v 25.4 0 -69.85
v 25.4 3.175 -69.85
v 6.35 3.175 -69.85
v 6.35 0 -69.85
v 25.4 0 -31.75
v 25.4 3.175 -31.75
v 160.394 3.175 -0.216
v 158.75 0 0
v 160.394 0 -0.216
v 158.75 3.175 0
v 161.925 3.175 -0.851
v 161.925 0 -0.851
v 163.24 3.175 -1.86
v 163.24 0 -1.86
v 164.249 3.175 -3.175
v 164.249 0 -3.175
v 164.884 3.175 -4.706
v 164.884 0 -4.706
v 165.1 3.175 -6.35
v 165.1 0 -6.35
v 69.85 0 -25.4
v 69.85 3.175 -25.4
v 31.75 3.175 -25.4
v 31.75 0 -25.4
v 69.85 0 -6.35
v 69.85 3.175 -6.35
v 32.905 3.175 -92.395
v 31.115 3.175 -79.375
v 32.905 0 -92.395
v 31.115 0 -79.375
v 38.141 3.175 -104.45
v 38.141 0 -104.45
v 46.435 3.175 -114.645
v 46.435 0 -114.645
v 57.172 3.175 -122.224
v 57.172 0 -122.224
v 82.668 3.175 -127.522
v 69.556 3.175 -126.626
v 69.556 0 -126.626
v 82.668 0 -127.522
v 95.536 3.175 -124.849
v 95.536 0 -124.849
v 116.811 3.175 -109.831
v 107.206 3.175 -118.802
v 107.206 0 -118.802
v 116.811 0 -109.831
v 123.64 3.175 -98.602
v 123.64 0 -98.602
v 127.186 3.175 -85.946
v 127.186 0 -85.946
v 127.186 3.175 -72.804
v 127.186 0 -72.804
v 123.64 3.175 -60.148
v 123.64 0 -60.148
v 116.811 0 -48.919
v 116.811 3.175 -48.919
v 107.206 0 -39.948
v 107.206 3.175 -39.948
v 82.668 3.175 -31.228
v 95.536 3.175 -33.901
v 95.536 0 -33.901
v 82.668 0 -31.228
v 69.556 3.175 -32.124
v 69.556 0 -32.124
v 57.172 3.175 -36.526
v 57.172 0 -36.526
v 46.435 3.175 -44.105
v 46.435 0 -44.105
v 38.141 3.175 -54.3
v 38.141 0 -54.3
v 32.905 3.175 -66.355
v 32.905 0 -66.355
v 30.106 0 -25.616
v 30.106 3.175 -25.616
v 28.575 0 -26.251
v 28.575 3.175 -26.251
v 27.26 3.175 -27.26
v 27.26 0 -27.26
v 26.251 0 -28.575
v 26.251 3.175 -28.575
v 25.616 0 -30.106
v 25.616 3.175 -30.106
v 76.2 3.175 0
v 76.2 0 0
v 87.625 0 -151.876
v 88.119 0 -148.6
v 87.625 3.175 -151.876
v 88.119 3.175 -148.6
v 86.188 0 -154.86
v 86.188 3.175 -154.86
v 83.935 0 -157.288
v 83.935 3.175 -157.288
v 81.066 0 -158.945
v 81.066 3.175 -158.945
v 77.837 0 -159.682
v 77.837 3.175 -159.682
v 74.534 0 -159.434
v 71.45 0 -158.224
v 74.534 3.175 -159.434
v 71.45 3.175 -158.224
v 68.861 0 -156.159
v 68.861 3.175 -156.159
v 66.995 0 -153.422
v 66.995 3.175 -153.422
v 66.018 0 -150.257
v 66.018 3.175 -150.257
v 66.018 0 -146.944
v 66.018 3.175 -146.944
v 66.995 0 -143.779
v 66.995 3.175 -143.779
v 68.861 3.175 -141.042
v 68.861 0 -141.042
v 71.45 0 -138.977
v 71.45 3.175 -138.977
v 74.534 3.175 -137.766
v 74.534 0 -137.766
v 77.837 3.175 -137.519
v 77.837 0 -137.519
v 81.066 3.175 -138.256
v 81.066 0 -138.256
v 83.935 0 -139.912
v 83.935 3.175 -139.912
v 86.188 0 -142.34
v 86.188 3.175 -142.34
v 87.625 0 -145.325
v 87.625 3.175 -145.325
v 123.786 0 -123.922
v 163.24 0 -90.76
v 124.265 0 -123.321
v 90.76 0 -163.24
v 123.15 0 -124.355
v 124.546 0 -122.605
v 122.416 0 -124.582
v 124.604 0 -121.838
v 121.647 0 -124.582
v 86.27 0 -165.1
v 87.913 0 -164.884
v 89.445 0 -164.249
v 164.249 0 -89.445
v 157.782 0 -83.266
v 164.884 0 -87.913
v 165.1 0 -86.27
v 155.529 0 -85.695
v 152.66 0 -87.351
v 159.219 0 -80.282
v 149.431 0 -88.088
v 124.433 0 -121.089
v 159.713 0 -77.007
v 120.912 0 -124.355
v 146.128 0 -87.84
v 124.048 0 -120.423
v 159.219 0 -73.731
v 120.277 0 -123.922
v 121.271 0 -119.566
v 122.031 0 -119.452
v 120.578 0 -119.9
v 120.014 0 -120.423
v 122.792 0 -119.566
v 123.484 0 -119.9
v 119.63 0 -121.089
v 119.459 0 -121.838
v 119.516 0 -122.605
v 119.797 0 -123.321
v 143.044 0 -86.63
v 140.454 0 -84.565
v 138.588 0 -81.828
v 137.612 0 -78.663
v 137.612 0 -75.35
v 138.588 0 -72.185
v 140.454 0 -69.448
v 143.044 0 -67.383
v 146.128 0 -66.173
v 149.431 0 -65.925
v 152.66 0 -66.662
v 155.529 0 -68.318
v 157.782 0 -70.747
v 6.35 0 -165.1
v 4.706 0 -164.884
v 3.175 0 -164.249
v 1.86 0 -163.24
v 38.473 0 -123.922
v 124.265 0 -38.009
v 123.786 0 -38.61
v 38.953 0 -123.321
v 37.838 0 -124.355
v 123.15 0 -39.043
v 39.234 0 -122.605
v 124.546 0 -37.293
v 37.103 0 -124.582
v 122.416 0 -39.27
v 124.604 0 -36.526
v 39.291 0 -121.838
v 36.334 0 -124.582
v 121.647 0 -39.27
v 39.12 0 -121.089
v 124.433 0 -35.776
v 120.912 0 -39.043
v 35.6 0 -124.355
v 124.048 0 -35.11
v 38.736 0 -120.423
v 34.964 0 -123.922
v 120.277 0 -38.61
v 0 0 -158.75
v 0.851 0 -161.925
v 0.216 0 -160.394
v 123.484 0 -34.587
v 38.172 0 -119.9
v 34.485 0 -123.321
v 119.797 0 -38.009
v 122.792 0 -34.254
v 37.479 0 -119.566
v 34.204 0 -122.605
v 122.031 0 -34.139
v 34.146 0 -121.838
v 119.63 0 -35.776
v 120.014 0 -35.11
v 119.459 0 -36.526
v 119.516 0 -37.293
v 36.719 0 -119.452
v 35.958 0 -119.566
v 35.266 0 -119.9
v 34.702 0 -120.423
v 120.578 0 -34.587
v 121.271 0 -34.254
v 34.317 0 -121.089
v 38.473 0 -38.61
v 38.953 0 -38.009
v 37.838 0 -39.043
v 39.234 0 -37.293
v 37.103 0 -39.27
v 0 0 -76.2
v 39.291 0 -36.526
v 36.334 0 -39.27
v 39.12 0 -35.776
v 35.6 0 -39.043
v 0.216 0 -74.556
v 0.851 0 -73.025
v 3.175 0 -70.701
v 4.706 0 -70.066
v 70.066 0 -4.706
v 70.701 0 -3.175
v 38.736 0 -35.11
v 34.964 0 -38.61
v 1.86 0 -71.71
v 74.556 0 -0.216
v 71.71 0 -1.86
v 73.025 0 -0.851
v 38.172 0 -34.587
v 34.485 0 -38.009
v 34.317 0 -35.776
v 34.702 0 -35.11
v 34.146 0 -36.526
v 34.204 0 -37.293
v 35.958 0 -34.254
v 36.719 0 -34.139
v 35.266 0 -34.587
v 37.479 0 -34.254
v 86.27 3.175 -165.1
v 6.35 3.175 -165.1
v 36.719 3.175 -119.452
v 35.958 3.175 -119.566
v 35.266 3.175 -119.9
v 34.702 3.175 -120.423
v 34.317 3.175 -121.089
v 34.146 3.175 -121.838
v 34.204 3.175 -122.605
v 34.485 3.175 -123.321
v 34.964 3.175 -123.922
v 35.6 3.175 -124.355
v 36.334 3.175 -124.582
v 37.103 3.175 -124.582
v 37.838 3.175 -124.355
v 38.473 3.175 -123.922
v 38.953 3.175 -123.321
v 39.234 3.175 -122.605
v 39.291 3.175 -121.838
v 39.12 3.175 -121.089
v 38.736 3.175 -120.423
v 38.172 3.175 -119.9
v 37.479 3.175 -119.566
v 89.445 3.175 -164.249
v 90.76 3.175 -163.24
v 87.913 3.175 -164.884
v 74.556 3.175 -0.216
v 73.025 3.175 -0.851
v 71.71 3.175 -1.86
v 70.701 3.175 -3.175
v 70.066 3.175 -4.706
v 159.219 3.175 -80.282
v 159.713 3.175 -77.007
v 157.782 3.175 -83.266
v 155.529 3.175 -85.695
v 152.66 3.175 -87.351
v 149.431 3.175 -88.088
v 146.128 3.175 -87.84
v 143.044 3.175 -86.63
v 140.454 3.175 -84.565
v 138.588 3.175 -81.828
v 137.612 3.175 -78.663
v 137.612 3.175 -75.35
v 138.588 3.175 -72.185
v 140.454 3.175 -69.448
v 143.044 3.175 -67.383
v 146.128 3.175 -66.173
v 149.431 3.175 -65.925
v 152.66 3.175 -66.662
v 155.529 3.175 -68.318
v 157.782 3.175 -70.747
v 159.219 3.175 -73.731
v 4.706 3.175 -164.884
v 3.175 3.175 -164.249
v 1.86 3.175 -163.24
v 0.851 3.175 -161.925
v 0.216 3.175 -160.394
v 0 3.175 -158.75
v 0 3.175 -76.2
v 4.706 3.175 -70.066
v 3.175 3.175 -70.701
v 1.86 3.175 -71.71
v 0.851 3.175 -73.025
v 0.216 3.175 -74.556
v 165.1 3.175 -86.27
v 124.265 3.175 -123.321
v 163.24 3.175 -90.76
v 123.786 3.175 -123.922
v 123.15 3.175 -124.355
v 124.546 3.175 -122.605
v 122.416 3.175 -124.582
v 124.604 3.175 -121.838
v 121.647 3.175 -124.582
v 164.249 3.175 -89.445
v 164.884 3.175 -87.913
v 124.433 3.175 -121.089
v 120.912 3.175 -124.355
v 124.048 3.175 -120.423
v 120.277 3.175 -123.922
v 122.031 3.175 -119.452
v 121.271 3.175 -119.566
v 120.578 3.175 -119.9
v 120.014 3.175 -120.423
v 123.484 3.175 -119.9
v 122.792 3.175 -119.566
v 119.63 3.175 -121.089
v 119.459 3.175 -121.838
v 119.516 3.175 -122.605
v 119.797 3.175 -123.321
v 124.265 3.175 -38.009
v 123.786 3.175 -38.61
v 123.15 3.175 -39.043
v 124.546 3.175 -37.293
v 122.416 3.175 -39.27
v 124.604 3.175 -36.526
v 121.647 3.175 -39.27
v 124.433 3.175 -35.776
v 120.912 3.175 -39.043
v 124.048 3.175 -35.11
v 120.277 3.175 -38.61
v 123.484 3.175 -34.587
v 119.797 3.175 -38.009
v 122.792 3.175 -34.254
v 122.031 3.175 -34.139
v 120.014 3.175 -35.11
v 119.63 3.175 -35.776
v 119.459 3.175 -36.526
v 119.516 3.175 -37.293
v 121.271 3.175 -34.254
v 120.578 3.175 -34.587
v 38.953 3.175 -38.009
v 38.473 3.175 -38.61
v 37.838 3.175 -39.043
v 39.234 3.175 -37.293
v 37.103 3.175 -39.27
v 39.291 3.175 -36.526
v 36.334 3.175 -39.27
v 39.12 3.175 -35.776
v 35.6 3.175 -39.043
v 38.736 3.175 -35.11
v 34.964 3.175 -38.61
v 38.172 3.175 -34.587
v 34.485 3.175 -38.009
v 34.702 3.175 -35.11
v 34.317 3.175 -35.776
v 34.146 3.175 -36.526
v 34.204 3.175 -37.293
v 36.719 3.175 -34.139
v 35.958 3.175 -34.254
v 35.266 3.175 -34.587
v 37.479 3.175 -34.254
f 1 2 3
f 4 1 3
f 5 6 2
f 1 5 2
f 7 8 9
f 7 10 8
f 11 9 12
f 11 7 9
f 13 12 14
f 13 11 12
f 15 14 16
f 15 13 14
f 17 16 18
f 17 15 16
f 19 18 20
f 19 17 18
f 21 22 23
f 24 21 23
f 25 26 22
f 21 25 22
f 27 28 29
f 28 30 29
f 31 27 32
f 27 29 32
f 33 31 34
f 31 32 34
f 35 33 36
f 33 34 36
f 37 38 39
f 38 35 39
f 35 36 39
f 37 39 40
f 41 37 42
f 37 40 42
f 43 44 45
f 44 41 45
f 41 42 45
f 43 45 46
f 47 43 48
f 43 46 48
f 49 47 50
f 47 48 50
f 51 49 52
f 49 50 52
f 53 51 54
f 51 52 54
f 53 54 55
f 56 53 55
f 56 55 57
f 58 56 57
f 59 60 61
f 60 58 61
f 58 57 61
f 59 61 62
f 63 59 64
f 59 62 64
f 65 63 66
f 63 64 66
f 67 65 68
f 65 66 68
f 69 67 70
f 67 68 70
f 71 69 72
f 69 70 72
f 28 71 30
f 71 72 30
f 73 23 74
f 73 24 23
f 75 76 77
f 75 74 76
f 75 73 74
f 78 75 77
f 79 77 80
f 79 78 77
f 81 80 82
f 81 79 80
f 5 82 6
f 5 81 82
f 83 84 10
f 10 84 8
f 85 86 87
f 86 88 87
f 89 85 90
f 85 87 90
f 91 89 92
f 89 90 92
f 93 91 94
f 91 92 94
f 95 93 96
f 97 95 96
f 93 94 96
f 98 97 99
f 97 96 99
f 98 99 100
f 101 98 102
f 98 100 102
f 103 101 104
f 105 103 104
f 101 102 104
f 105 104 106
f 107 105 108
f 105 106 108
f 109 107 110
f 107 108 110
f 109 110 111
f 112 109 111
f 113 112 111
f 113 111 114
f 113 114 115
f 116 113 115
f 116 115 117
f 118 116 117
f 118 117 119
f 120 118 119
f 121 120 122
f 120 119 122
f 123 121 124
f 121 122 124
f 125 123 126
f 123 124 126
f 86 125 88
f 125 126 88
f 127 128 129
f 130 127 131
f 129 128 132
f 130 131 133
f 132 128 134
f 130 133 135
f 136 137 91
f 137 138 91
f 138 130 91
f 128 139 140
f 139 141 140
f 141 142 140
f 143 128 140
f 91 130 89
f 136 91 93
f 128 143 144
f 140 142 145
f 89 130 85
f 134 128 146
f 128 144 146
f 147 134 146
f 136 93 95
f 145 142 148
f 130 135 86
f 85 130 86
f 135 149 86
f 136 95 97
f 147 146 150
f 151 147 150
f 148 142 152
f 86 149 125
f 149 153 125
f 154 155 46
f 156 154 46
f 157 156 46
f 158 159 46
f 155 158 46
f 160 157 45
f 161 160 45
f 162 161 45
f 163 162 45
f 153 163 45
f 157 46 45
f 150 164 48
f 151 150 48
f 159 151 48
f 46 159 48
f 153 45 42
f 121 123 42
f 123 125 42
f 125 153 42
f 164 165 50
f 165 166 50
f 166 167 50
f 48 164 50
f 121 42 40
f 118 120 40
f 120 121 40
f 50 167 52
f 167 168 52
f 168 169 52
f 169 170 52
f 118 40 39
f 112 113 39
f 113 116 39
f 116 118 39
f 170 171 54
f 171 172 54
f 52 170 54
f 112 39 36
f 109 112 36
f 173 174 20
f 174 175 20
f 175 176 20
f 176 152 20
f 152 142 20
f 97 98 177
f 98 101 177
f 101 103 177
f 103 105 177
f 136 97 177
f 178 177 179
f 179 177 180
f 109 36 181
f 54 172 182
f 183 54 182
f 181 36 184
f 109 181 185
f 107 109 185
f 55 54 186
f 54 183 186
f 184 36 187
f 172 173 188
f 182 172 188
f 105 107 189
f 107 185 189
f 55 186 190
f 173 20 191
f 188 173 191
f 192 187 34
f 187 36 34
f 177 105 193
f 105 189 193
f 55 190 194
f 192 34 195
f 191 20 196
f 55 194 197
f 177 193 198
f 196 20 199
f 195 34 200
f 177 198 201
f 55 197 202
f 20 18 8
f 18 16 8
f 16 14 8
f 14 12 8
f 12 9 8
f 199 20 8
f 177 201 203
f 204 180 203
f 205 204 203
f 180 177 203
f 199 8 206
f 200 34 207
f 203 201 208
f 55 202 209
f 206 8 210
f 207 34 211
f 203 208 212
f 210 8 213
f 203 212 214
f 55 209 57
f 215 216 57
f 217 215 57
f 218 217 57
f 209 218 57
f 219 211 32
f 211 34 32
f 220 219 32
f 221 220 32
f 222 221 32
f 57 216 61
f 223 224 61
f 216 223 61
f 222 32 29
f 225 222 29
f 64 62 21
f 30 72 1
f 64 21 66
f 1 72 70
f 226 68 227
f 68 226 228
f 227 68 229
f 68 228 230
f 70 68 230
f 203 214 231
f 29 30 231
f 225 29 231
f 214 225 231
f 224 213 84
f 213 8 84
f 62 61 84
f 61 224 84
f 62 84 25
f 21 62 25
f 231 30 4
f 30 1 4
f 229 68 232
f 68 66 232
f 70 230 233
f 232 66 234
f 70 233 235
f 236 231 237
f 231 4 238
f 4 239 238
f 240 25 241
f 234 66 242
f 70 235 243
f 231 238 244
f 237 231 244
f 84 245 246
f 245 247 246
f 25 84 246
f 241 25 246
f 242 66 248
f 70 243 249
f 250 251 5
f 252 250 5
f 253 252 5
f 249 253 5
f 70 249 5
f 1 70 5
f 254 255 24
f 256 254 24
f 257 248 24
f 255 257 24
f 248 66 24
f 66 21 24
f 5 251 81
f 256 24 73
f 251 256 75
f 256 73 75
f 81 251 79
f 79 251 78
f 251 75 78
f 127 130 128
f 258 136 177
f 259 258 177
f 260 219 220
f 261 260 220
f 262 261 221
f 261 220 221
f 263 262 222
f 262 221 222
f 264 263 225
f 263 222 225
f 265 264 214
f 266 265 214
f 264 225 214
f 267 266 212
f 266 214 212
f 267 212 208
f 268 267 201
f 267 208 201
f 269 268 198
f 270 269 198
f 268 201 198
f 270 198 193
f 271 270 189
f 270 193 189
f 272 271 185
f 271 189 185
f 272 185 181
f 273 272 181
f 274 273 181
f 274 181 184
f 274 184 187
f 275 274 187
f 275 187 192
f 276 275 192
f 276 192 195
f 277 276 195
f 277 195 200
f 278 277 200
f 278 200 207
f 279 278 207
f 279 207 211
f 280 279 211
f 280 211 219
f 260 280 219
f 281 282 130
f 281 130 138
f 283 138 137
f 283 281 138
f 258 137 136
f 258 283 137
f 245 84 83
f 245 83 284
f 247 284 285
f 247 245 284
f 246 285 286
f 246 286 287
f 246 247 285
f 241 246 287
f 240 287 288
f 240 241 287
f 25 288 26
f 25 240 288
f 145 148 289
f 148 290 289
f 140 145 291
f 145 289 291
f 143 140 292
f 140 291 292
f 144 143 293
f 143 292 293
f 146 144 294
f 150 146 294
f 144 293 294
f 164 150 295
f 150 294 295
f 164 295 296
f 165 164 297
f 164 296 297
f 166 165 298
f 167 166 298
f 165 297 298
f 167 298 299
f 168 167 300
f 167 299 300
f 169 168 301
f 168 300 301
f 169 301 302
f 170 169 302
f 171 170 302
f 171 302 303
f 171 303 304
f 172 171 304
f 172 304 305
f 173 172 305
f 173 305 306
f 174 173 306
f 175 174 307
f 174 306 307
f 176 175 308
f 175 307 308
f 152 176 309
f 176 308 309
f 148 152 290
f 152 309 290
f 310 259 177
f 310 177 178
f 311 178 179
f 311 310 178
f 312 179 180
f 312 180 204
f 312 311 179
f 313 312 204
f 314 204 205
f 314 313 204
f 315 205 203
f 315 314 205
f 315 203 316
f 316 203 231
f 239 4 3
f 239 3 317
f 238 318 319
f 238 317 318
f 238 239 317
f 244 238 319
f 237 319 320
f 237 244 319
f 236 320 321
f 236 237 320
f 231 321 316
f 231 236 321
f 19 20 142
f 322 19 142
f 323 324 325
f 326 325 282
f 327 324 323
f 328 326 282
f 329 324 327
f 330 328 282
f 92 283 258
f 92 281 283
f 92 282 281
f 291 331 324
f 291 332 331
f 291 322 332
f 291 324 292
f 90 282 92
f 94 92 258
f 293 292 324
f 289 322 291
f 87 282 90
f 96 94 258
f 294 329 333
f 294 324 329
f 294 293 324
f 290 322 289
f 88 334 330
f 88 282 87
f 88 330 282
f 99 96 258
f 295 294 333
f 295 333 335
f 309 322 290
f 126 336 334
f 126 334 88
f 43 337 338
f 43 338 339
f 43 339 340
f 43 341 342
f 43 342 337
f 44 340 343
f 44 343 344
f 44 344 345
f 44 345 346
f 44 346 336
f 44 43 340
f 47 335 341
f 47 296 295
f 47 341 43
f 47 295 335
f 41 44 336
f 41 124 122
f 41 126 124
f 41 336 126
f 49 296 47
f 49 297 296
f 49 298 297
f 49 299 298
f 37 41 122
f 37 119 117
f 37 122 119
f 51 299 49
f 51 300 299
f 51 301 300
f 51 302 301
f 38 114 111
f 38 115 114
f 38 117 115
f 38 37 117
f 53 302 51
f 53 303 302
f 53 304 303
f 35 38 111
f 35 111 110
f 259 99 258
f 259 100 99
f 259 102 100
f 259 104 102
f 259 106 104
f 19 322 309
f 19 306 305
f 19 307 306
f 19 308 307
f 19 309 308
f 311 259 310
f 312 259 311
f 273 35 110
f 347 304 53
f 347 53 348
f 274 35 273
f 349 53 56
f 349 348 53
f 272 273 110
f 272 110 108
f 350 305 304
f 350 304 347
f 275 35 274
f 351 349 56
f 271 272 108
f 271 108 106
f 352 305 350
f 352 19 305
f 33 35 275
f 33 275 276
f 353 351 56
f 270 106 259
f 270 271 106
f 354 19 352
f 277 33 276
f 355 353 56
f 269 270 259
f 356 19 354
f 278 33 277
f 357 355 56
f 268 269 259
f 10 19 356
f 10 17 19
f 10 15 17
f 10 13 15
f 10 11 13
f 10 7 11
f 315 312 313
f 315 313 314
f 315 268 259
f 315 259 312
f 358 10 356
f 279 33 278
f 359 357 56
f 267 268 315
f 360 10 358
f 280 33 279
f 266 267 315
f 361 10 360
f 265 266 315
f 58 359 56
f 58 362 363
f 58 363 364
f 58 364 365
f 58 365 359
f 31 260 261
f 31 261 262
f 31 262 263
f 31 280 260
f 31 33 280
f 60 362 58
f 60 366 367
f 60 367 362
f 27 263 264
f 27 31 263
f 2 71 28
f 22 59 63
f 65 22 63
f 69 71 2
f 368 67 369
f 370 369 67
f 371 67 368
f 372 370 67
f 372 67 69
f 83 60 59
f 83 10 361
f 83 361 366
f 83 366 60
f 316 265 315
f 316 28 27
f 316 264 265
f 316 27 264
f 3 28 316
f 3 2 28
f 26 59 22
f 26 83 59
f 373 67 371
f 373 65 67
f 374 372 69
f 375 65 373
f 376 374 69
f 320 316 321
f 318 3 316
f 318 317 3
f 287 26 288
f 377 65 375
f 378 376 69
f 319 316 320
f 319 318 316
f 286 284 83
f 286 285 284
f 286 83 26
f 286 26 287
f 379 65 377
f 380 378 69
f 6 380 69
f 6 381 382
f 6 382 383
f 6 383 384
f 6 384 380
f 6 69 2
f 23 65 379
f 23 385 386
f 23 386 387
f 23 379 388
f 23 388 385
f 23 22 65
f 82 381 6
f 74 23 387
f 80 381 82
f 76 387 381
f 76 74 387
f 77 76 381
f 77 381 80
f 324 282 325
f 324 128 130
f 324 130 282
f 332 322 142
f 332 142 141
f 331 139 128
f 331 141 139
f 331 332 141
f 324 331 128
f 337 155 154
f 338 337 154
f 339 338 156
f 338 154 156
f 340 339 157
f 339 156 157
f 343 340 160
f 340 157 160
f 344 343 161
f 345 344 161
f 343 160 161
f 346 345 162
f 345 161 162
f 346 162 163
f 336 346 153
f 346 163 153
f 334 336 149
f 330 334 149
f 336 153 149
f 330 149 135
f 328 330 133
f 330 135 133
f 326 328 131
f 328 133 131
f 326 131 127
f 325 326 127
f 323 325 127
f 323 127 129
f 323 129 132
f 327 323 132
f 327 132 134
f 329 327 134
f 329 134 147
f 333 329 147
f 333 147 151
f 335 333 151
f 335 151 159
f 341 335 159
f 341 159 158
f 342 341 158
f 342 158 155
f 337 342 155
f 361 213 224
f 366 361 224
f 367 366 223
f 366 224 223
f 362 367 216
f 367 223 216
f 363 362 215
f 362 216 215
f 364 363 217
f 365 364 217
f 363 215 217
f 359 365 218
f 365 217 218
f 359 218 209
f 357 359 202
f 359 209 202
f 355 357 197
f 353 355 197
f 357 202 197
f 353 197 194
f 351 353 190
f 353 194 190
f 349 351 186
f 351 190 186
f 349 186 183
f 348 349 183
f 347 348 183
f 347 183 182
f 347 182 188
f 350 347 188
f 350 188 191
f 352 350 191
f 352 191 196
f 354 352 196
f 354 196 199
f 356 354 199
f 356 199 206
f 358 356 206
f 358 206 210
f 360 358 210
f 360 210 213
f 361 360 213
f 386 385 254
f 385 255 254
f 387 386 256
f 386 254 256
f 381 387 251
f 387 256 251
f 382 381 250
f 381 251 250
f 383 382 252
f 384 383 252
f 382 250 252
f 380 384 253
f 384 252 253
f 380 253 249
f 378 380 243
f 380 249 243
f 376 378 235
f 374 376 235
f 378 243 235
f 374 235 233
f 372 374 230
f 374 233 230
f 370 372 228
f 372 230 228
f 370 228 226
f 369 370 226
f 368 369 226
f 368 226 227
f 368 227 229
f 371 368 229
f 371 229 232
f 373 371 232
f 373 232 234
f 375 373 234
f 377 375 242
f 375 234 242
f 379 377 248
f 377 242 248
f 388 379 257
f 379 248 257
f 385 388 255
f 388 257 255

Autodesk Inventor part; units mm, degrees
ref_plane "YZ Plane" through (0, 0, 0) normal (1, 0, 0) x (0, 1, 0)
ref_plane "XZ Plane" through (0, 0, 0) normal (0, 1, 0) x (-1, 0, 0)
ref_plane "XY Plane" through (0, 0, 0) normal (0, 0, 1) x (1, 0, 0)
sketch "Sketch1" plane through (0, 0, 0) normal (0, 1, 0) x (-1, 0, 0)
  line L0 (0, 0) -> (-165.1, 0)
  line L1 (-165.1, 0) -> (-165.1, -165.1)
  line L2 (-165.1, -165.1) -> (0, -165.1)
  line L3 (0, -165.1) -> (0, 0)
  circle A0 centre (-79.375, -79.375) radius 48.26
  line L4 (-25.4, -165.1) -> (-25.4, 0) construction
  line L5 (0, -25.4) -> (-165.1, -25.4) construction
  line L6 (0, 0) -> (-165.1, -165.1) construction
  circle A1 centre (-79.375, -79.375) radius 53.975 construction
  dimension "d0" = 96.52
  dimension "d3" = 25.4
  dimension "d4" = 25.4
  dimension "d5" = 107.95
  dimension "d24" = 165.1
extrude "Extrusion1" add sketch "Sketch1" along normal blind 3.175
sketch "Sketch2" plane through (0, 3.175, 0) normal (0, 1, 0) x (1, 0, 0)
  circle A0 centre (79.375, 79.375) radius 48.26 construction
  circle A1 centre (79.375, 79.375) radius 60.325 construction
  line L0 (0, 165.1) -> (0, 0) construction
  arc A2 (177.8, 76.2) -> (76.2, 177.8) centre (76.2, 76.2) ccw construction
  line L1 (36.7188, 36.7188) -> (122.0312, 36.7188) construction
  line L2 (122.0312, 36.7188) -> (122.0312, 122.0312) construction
  line L3 (122.0312, 122.0312) -> (36.7188, 122.0312) construction
  line L4 (36.7188, 122.0312) -> (36.7188, 36.7188) construction
  dimension "d9" = 120.65
hole "Hole1" at (36.7188, 3.175, -36.7188) at (122.0312, 3.175, -122.0312) at (122.0312, 3.175, -36.7188) at (36.7188, 3.175, -122.0312) direction (0, -1, 0) diameter 5.1594 end through all
sketch "Sketch4" plane through (0, 3.175, 0) normal (0, 1, 0) x (1, 0, 0)
  line L0 (0, 0) -> (165.1, 0) projected
  line L1 (0, 0) -> (25.4, 0)
  line L2 (25.4, 0) -> (25.4, 69.85)
  line L3 (25.4, 69.85) -> (0, 69.85)
  line L4 (0, 69.85) -> (0, 0)
  line L5 (25.4, 0) -> (69.85, 0)
  line L6 (69.85, 0) -> (69.85, 25.4)
  line L7 (69.85, 25.4) -> (25.4, 25.4)
  line L8 (25.4, 25.4) -> (25.4, 0)
  dimension "d26" = 25.4
  dimension "d27" = 69.85
  dimension "d28" = 44.45
  dimension "d29" = 25.4
extrude "Extrusion3" cut sketch "Sketch4" against normal through all
chamfer "Chamfer1" distance 76.2 angle 45 1 edges at (165.1, 1.5875, -165.1)
fillet "Fillet4" radius 6.35 7 edges at (165.1, 1.5875, 0) (165.1, 1.5875, -88.9) (88.9, 1.5875, -165.1) (0, 1.5875, -165.1) (0, 1.5875, -69.85) (25.4, 1.5875, -25.4) (69.85, 1.5875, 0)
sketch "Sketch5" plane through (0, 3.175, 0) normal (0, 1, 0) x (1, 0, 0)
  circle A0 centre (148.6003, 77.0066) radius 11.1125
  circle A1 centre (79.375, 79.375) radius 48.26 construction
  circle A2 centre (79.375, 79.375) radius 69.2658 construction
  circle A3 centre (136.0149, 57.9229) radius 25.4 construction
  circle A4 centre (122.0312, 36.7188) radius 2.5797 construction
  circle A5 centre (136.0149, 57.9229) radius 22.86 construction
  line L0 (122.0312, 36.7188) -> (148.6003, 77.0066) construction
  circle A6 centre (36.7188, 36.7188) radius 2.5797 construction
  circle A7 centre (122.0312, 122.0312) radius 2.5797 construction
  line L1 (36.7188, 36.7188) -> (122.0312, 122.0312) construction
  circle A8 centre (77.0066, 148.6003) radius 11.1125
  point P0 (0, 0)
  dimension "d38" = 138.5316
  dimension "d39" = 50.8
  dimension "d40" = 45.72
  dimension "d37" = 22.225
extrude "Extrusion4" cut sketch "Sketch5" against normal through all
properties part number "BottomPlate" material "Aluminum 6061"
